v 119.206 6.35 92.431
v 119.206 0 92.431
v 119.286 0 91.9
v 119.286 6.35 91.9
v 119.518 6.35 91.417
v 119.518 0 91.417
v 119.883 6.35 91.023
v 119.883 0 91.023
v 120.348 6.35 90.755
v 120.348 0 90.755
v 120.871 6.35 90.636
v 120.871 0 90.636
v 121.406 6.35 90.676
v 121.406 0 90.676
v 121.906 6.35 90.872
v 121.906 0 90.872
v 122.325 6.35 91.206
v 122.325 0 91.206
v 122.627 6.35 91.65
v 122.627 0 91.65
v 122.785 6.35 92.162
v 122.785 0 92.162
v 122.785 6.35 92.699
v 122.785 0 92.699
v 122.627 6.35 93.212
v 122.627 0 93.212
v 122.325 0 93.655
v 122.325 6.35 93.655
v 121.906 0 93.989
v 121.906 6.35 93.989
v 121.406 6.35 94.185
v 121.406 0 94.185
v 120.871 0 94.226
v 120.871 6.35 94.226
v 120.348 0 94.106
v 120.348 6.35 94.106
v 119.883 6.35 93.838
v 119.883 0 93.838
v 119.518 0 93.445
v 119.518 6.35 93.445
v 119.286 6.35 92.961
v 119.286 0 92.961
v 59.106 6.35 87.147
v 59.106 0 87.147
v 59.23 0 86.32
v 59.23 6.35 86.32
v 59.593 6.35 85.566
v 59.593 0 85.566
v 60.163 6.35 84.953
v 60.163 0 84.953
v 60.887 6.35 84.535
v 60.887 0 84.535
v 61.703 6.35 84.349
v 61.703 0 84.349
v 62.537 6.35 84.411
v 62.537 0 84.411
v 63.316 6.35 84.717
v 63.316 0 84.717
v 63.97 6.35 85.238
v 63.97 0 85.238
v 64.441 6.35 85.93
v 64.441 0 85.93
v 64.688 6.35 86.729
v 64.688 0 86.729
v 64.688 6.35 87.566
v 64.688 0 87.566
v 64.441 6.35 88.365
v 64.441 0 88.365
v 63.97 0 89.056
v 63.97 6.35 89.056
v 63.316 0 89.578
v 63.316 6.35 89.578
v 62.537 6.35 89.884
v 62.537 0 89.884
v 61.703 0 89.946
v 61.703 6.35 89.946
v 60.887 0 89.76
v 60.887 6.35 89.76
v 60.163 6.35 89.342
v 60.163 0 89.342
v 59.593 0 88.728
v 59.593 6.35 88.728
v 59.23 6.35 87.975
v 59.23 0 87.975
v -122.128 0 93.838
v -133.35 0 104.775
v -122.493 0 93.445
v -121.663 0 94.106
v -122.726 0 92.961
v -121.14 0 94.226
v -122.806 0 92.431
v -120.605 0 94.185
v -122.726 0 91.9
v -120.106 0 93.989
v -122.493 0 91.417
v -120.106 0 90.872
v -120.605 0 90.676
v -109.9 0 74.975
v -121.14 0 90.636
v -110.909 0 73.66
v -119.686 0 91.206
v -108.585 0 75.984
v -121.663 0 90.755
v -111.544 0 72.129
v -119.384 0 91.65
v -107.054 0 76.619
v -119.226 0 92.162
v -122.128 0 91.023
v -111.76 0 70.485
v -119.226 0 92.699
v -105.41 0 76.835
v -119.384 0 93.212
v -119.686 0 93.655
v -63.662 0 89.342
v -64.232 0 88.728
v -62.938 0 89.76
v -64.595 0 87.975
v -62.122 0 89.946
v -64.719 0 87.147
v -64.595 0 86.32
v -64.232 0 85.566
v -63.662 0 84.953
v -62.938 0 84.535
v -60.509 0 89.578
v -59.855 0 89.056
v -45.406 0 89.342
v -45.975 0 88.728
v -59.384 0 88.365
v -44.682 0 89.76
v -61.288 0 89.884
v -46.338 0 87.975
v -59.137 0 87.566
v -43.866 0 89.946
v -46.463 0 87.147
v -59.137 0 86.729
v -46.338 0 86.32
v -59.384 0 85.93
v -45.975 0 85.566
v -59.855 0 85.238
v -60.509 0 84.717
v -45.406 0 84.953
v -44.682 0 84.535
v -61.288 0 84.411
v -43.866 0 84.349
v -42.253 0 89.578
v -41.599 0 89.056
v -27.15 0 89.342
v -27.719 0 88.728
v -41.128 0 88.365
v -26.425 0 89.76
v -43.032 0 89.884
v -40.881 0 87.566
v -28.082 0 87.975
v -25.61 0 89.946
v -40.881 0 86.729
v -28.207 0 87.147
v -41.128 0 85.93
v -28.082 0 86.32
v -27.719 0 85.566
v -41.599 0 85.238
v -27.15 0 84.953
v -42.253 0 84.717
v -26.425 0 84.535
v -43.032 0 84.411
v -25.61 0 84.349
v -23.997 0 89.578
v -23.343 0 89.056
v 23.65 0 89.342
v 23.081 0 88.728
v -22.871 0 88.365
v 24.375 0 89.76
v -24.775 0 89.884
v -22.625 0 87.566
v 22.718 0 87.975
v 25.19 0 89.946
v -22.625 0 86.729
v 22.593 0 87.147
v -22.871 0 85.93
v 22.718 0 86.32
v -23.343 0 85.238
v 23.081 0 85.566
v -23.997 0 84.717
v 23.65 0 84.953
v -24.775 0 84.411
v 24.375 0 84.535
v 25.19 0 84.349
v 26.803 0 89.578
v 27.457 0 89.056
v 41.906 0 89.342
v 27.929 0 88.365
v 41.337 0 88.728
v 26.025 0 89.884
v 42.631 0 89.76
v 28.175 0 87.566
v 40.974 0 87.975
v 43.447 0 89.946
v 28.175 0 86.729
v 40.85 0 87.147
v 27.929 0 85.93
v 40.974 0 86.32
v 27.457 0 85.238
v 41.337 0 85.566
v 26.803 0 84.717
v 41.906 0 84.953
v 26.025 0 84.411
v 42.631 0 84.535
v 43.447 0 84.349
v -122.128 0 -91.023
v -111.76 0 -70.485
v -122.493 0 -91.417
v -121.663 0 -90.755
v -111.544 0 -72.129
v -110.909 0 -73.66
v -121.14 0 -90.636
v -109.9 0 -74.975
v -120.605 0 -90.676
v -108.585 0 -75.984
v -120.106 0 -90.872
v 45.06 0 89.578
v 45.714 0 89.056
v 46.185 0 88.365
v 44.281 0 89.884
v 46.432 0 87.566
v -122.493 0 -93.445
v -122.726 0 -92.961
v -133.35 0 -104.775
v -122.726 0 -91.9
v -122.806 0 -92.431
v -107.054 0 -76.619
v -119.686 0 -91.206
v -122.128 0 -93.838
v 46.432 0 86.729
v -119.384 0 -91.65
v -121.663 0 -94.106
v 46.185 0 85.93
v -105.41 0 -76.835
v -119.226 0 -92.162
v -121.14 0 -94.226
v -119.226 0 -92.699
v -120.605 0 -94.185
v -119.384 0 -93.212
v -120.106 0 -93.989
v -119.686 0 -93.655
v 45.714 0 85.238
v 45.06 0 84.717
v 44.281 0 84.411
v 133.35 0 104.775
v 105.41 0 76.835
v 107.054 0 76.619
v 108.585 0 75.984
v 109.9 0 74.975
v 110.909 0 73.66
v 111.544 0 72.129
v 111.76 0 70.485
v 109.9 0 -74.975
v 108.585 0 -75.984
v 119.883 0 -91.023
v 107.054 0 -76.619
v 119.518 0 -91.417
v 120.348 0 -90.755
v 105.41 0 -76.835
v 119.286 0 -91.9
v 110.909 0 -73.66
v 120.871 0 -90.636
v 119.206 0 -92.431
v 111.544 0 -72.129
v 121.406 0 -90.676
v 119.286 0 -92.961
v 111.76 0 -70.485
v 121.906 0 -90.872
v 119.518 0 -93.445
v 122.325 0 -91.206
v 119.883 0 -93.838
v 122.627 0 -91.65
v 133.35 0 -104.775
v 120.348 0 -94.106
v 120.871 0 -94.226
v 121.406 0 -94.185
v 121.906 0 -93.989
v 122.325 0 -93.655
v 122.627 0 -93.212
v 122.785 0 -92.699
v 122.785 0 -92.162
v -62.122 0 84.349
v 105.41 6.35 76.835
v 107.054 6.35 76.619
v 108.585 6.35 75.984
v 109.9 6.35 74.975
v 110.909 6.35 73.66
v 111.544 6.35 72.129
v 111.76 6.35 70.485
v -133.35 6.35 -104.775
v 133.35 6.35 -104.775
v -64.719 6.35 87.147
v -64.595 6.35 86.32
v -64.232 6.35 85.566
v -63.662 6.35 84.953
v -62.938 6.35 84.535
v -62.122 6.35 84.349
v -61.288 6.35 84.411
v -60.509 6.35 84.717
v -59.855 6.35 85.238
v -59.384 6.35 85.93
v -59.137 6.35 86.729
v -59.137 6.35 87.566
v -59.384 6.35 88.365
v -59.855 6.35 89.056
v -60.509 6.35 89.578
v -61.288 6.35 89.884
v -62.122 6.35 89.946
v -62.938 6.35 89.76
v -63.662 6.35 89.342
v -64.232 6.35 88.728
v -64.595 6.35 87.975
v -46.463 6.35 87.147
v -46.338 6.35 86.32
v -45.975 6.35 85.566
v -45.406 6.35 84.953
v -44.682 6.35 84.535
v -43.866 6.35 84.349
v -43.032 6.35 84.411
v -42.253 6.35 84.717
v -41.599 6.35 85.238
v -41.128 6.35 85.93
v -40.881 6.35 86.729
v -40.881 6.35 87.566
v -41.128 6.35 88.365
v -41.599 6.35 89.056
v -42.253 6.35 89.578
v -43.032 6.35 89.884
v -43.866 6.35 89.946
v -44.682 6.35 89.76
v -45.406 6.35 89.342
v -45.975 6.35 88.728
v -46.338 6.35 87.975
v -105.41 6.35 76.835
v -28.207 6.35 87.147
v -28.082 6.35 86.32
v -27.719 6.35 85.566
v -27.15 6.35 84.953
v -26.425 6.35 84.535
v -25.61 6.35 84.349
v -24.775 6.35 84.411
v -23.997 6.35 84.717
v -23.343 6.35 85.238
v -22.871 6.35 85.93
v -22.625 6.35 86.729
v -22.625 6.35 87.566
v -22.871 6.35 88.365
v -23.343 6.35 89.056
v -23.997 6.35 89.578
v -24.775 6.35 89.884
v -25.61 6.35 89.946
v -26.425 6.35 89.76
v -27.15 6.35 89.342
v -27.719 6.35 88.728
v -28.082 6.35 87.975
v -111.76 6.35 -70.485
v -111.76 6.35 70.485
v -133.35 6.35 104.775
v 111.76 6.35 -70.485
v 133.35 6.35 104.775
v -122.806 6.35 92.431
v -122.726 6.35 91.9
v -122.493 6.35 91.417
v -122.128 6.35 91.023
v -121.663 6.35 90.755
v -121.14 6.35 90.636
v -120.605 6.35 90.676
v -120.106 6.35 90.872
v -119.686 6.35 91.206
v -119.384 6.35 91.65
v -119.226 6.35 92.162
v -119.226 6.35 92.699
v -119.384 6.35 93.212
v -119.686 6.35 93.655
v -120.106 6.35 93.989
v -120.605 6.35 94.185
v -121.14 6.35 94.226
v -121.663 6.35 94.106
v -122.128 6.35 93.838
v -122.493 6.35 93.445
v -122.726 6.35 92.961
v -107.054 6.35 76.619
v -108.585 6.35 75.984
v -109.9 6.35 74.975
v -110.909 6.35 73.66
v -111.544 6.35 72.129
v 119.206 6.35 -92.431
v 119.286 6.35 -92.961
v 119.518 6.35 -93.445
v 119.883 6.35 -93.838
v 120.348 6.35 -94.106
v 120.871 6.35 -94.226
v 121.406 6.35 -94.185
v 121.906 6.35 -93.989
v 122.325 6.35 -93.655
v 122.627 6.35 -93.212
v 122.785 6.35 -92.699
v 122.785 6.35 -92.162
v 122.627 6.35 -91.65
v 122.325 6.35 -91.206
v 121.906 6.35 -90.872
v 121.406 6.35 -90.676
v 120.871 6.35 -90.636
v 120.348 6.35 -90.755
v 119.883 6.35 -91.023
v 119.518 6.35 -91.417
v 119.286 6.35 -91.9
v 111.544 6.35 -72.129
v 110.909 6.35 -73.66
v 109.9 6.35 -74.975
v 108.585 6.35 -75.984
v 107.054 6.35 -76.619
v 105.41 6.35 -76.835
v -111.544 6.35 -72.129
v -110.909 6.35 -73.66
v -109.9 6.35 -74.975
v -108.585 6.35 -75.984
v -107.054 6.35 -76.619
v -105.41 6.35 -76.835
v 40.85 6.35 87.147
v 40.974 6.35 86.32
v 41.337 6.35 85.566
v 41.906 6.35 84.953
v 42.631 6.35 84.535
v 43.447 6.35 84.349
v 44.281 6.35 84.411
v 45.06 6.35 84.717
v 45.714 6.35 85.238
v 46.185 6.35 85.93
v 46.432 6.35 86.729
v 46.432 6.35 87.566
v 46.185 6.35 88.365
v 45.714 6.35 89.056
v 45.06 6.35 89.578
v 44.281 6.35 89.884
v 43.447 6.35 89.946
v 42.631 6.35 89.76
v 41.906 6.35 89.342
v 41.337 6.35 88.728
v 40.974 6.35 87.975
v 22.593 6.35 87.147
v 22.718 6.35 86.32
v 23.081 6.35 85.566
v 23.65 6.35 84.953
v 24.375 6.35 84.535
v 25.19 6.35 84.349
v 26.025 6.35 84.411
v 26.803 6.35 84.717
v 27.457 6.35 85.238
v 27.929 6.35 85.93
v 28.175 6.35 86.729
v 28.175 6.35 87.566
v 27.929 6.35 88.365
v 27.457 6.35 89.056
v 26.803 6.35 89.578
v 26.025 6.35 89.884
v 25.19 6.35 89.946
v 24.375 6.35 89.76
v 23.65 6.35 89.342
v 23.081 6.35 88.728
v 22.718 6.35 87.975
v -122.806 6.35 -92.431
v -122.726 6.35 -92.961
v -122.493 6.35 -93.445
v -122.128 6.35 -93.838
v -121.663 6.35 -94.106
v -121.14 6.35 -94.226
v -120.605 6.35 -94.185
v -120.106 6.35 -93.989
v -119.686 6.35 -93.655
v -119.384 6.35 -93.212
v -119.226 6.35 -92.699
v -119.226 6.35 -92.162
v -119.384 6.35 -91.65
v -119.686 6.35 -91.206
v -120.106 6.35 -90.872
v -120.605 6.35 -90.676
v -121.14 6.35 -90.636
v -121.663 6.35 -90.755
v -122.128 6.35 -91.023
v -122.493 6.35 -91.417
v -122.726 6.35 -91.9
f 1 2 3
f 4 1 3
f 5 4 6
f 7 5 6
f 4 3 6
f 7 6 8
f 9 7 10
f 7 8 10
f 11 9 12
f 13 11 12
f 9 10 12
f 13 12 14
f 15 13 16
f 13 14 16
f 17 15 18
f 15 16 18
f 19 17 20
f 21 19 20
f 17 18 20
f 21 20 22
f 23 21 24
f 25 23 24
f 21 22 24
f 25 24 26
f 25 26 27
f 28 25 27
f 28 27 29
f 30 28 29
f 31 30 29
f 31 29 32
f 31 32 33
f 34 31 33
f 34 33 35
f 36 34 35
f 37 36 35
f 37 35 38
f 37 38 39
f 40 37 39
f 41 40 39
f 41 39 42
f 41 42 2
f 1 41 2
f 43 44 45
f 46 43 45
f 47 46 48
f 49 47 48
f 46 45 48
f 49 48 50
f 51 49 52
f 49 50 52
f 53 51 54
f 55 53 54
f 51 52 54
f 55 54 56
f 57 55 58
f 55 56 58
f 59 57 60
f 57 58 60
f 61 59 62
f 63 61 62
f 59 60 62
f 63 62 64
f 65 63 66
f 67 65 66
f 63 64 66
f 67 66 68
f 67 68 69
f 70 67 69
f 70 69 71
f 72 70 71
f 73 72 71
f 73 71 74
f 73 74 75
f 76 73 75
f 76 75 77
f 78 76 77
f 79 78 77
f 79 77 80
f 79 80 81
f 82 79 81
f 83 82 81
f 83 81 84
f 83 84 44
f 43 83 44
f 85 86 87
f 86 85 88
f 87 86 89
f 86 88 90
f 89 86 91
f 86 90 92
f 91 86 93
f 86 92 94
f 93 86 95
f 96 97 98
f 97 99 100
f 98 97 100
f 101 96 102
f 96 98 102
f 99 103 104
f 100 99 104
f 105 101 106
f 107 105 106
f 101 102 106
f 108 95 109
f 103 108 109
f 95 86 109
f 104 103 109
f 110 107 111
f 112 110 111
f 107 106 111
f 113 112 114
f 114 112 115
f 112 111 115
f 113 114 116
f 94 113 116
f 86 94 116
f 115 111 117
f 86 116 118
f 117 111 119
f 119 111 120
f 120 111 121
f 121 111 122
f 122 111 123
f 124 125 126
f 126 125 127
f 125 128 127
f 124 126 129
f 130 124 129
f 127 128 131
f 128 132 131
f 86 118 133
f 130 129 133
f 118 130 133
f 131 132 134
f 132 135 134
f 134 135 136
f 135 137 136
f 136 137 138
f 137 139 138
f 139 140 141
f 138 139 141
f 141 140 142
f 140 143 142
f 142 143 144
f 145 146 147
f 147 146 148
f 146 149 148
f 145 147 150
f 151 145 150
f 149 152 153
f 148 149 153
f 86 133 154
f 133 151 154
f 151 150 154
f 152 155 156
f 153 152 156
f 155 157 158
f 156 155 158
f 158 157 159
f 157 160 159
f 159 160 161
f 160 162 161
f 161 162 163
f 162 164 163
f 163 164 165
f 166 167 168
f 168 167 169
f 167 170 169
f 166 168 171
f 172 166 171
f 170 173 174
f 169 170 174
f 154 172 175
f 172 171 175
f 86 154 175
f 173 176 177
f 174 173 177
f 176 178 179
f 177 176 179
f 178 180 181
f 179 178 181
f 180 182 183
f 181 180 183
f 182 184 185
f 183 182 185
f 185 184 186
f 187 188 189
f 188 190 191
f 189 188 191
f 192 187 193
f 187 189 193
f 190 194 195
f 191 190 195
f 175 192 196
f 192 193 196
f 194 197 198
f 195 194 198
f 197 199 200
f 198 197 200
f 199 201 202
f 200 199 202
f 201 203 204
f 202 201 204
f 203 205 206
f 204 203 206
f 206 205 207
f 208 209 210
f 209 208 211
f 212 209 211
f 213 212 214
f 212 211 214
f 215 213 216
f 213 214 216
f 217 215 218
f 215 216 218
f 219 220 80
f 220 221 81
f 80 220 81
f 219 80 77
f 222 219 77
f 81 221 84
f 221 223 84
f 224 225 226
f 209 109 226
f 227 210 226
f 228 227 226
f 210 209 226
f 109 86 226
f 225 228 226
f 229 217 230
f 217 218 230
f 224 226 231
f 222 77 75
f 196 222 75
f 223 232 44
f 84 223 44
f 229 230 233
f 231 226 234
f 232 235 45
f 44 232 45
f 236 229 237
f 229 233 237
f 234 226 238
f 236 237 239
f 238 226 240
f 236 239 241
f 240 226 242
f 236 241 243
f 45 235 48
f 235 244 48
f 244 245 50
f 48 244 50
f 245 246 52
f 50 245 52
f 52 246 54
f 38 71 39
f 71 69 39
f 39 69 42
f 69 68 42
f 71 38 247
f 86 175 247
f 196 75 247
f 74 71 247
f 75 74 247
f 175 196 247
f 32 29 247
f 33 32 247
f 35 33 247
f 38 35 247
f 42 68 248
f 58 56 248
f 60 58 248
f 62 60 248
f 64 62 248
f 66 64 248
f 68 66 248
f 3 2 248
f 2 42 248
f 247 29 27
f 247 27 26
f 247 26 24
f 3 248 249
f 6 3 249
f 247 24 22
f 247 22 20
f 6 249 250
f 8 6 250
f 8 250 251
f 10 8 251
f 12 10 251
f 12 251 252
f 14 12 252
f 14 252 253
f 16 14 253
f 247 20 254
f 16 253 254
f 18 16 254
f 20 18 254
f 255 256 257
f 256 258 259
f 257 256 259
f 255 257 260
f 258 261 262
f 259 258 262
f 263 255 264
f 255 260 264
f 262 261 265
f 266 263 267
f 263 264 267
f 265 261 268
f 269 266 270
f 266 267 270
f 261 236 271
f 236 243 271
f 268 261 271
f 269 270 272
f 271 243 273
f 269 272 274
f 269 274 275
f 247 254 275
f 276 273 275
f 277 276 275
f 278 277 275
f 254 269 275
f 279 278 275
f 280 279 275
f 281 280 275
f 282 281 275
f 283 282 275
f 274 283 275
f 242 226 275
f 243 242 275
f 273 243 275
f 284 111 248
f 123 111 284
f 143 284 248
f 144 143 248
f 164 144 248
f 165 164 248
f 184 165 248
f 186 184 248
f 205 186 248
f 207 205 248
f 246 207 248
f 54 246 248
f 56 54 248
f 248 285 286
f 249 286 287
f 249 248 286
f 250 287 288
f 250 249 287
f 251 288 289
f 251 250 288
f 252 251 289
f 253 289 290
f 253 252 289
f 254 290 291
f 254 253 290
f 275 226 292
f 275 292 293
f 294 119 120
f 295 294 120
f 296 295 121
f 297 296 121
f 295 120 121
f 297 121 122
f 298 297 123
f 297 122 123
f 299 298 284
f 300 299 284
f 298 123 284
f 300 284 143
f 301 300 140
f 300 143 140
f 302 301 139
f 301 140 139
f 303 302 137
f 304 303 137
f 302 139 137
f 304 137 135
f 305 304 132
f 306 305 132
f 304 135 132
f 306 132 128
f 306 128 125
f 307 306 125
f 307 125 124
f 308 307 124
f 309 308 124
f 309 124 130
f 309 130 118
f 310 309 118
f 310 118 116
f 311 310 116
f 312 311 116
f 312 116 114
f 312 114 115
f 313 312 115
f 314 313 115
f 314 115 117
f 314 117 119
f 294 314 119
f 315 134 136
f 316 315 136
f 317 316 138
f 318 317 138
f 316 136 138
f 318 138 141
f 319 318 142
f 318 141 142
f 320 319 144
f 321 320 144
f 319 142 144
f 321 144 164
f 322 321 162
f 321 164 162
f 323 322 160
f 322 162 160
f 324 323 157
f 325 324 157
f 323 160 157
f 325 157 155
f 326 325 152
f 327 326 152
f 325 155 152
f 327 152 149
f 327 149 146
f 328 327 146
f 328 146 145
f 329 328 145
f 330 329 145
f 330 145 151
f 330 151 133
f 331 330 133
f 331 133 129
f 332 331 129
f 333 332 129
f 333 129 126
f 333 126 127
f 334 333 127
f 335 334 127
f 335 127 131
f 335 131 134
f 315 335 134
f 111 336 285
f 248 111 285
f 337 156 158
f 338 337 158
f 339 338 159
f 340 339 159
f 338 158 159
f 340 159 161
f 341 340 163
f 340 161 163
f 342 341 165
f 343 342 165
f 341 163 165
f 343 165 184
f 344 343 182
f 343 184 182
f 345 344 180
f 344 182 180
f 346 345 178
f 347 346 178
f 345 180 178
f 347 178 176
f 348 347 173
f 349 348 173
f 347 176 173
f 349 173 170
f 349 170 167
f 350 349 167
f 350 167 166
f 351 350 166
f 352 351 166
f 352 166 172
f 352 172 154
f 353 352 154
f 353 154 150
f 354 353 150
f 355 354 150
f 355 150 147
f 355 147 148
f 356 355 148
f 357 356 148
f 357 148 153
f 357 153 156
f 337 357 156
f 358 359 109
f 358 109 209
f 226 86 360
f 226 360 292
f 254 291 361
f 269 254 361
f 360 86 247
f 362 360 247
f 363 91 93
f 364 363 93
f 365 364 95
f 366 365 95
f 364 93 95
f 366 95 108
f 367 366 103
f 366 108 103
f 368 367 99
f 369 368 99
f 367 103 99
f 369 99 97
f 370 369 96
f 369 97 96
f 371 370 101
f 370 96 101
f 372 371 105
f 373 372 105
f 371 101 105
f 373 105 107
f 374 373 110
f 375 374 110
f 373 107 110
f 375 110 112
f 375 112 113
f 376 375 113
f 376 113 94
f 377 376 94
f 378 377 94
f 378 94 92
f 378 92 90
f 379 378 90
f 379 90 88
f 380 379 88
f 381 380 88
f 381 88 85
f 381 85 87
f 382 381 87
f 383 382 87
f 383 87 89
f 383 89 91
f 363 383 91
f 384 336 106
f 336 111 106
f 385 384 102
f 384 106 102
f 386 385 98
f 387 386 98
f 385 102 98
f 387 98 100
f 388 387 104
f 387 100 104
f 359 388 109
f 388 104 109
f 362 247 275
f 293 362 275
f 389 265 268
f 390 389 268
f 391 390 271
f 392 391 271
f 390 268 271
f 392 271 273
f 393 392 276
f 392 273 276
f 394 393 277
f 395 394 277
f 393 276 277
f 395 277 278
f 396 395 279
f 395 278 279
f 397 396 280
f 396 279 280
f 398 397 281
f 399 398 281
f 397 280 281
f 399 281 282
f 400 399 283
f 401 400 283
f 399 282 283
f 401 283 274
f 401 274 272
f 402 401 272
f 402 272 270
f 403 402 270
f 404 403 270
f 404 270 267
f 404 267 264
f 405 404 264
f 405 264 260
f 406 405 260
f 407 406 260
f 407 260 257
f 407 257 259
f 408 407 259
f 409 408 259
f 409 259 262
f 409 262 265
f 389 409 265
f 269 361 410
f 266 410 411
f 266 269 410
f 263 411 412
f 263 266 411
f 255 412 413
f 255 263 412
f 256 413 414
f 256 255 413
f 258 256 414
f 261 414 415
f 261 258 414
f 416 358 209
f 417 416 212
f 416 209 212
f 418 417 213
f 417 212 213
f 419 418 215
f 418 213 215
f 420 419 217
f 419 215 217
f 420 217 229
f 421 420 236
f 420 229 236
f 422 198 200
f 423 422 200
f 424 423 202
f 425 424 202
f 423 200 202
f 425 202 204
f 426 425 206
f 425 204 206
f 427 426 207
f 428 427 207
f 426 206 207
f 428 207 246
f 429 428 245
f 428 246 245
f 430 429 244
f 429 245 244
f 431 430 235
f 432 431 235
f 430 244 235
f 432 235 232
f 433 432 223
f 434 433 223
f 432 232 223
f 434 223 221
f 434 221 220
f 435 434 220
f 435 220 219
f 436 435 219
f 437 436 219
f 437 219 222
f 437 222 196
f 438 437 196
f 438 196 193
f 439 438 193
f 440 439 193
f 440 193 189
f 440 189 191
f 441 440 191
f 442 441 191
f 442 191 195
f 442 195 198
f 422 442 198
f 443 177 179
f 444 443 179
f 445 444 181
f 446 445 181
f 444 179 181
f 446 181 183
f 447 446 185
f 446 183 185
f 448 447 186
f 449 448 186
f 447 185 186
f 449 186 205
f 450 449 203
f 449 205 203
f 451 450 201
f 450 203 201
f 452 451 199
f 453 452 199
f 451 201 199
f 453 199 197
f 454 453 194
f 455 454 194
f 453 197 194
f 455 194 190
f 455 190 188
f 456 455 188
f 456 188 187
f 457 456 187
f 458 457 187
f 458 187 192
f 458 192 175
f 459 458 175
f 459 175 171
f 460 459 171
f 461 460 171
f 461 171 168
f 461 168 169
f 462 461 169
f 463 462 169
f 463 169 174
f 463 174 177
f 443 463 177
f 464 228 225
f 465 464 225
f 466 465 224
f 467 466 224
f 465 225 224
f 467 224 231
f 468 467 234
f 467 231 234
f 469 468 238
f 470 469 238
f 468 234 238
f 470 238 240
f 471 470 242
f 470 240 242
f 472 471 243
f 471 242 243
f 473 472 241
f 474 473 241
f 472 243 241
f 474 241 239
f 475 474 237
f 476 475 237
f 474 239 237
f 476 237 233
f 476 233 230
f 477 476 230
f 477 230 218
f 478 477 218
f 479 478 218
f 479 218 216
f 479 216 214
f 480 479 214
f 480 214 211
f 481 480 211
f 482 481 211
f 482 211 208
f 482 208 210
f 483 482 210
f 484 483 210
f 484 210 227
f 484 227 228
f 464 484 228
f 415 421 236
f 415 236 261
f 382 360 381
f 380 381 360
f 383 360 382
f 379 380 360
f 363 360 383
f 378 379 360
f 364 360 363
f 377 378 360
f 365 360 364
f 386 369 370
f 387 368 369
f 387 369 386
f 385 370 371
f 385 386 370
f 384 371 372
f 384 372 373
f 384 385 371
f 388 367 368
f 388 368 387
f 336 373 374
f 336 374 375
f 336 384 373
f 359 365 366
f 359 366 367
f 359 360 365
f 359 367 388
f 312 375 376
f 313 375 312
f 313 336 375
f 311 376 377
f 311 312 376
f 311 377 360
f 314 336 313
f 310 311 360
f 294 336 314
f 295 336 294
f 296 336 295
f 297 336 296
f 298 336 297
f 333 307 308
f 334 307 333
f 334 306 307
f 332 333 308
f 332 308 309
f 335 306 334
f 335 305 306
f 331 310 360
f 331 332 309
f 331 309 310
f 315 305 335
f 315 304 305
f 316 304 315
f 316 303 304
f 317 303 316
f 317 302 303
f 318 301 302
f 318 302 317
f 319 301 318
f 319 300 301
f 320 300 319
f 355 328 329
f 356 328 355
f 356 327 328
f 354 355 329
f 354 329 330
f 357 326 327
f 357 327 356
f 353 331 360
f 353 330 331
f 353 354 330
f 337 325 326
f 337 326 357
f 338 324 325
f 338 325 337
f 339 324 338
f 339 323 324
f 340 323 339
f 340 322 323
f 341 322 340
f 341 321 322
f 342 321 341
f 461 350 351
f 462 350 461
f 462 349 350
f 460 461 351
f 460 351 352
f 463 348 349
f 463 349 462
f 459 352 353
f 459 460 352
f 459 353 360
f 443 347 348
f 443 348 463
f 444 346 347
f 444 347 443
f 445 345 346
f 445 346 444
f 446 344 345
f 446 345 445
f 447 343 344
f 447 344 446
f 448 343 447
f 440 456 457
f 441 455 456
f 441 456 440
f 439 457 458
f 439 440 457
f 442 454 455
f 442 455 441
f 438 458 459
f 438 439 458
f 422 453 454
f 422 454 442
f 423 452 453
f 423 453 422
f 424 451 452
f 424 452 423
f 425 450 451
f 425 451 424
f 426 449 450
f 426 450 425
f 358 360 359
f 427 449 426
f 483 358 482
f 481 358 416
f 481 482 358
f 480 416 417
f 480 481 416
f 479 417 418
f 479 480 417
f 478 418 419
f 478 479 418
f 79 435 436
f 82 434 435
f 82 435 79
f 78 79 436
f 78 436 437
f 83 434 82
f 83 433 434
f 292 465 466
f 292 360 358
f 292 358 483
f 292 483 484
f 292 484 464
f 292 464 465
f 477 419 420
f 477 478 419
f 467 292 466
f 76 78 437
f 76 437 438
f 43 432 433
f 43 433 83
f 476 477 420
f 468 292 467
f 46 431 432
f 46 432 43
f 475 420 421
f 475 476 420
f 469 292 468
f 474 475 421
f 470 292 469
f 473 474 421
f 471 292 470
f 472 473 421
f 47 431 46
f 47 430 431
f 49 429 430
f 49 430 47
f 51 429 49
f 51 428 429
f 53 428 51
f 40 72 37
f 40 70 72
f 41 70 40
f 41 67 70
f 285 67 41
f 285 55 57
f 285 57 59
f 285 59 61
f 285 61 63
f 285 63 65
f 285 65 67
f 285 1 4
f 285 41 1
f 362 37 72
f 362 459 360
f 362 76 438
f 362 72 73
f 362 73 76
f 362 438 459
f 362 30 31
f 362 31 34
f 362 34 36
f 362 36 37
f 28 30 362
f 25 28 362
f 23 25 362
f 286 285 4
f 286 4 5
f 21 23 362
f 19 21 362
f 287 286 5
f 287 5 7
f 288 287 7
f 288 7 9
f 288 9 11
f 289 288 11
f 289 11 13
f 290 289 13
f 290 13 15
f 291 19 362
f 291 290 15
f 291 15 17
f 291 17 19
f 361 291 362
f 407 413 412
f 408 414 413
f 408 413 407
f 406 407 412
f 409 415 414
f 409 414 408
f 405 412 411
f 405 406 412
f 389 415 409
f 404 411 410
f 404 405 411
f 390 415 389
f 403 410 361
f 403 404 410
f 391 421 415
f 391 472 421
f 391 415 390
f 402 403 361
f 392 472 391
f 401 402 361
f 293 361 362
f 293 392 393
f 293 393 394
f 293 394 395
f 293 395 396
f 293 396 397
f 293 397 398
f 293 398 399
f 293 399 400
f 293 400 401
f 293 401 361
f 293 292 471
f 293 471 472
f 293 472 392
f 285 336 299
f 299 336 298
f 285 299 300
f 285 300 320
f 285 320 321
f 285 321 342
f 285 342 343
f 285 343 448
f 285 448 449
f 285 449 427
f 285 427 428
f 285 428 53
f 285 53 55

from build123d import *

# Parameters (mm, degrees)
SKETCH1_W              = 266.7
SKETCH1_H              = 209.55
BOSS_EXTRUDE1_DEPTH    = 6.35
M3_CLEARANCE_HOLE1_D   = 3.6
SKETCH4_W              = 223.52
SKETCH4_H              = 153.67
CUT_EXTRUDE1_DEPTH     = 170.706645789
F_10_CLEARANCE_HOLE1_D = 5.6134
FILLET1_R              = 6.35


with BuildPart() as part:
    # Sketch1 → Boss-Extrude1 (new body)
    with BuildSketch(Plane(origin=(0, 0, 0), x_dir=(1, 0, 0), z_dir=(0, 1, 0))):
        Rectangle(SKETCH1_W, SKETCH1_H)
    extrude(amount=BOSS_EXTRUDE1_DEPTH)

    # M3 Clearance Hole1 (through all)
    with Locations(Plane(origin=(0, 6.35, 0), x_dir=(1, 0, 0), z_dir=(0, 1, 0))):
        with Locations((121.0056, -92.4306), (-121.0056, -92.4306), (-121.0056, 92.4306), (121.0056, 92.4306)):
            Hole(M3_CLEARANCE_HOLE1_D / 2)

    # Sketch4 → Cut-Extrude1 (cut, through all)
    with BuildSketch(Plane(origin=(0, 6.35, 0), x_dir=(1, 0, 0), z_dir=(0, 1, 0))):
        Rectangle(SKETCH4_W, SKETCH4_H)
    extrude(amount=-CUT_EXTRUDE1_DEPTH, mode=Mode.SUBTRACT)

    # #10 Clearance Hole1 (through all)
    with Locations(Plane(origin=(0, 6.35, 0), x_dir=(1, 0, 0), z_dir=(0, 1, 0))):
        with Locations((-61.9125, -87.1474), (-43.65625, -87.1474), (-25.4, -87.1474), (25.4, -87.1474), (43.65625, -87.1474), (61.9125, -87.1474)):
            Hole(F_10_CLEARANCE_HOLE1_D / 2)

    # Fillet1
    fillet1_edges = [part.edges().sort_by_distance(p)[0] for p in [
        (-111.76, 3.175, 76.835),
        (-111.76, 3.175, -76.835),
        (111.76, 3.175, -76.835),
        (111.76, 3.175, 76.835),
    ]]
    fillet(fillet1_edges, radius=FILLET1_R)


solid = part.part
